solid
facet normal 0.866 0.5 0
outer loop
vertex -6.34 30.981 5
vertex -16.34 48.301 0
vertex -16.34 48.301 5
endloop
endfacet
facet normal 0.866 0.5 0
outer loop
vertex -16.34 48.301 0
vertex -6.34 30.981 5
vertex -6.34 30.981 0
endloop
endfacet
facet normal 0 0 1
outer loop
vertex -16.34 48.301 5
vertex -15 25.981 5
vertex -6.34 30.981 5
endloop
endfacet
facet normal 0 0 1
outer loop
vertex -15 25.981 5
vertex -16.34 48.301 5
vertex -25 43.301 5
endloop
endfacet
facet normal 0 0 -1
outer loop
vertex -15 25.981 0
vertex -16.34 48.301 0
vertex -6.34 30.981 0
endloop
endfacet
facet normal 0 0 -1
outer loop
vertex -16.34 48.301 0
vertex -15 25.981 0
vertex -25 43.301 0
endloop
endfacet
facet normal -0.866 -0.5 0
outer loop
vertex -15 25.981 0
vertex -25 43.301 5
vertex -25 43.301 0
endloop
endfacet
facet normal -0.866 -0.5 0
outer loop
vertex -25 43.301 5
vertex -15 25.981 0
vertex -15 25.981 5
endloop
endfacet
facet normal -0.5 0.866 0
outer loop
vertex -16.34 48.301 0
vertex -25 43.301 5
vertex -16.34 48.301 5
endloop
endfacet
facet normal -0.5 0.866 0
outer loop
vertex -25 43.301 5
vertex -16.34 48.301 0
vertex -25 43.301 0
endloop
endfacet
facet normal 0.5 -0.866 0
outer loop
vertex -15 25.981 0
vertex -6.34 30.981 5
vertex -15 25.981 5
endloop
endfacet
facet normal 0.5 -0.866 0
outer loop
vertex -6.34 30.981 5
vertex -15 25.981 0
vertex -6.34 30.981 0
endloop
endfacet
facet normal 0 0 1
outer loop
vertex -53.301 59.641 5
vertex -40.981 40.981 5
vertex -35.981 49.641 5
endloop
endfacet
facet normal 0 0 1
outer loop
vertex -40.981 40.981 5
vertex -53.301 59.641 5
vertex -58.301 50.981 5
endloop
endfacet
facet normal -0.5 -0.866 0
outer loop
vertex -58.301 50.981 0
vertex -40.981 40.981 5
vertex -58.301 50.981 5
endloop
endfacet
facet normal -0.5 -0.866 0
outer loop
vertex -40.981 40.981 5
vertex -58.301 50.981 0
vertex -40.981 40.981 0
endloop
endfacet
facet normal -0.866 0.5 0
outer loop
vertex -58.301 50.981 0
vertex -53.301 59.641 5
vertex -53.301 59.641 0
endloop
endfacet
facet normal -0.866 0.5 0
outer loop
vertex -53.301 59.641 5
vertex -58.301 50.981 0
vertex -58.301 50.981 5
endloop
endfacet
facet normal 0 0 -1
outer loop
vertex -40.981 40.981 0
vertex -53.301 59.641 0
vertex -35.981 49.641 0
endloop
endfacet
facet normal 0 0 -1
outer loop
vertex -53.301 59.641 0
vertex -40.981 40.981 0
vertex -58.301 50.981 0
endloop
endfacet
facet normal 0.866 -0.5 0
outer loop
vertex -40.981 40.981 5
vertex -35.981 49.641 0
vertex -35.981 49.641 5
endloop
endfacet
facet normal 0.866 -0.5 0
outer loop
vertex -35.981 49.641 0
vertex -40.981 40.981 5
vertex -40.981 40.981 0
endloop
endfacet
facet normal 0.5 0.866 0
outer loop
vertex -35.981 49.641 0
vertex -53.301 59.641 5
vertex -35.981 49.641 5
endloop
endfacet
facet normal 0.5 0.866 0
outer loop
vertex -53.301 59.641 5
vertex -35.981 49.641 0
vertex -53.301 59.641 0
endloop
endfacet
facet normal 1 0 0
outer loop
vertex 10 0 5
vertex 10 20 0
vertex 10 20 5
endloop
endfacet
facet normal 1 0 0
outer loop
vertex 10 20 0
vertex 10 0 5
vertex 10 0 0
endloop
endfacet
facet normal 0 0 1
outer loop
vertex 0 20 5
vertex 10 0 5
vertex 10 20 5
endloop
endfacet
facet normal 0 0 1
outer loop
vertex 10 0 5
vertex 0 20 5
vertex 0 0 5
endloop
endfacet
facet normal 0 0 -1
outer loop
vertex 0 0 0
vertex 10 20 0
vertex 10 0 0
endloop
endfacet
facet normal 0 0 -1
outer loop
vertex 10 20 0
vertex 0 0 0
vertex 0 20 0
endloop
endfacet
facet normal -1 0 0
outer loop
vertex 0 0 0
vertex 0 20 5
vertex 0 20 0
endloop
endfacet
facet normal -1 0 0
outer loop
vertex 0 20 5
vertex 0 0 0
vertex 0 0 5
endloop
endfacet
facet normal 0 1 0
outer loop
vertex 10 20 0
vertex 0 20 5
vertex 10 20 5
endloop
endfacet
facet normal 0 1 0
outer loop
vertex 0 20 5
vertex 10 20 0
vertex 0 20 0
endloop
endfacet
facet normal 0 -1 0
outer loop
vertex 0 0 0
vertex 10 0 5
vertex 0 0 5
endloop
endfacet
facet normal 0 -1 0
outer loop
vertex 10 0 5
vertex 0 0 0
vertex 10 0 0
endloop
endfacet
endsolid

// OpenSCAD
/*
cd /Users/d/Desktop/3dprint/ImplicitCad/
~/.cabal/bin/extopenscad c.scad
*/
$res = 1;
union() {
    cube(size=[10,20,5]);
    rotate(30)
    translate([0,30,0]) 
    {
        cube(size=[10,20,5]);
        rotate(30)
        translate([0,30,0]) 
        {
            cube(size=[10,20,5]);
        }
    }
}
